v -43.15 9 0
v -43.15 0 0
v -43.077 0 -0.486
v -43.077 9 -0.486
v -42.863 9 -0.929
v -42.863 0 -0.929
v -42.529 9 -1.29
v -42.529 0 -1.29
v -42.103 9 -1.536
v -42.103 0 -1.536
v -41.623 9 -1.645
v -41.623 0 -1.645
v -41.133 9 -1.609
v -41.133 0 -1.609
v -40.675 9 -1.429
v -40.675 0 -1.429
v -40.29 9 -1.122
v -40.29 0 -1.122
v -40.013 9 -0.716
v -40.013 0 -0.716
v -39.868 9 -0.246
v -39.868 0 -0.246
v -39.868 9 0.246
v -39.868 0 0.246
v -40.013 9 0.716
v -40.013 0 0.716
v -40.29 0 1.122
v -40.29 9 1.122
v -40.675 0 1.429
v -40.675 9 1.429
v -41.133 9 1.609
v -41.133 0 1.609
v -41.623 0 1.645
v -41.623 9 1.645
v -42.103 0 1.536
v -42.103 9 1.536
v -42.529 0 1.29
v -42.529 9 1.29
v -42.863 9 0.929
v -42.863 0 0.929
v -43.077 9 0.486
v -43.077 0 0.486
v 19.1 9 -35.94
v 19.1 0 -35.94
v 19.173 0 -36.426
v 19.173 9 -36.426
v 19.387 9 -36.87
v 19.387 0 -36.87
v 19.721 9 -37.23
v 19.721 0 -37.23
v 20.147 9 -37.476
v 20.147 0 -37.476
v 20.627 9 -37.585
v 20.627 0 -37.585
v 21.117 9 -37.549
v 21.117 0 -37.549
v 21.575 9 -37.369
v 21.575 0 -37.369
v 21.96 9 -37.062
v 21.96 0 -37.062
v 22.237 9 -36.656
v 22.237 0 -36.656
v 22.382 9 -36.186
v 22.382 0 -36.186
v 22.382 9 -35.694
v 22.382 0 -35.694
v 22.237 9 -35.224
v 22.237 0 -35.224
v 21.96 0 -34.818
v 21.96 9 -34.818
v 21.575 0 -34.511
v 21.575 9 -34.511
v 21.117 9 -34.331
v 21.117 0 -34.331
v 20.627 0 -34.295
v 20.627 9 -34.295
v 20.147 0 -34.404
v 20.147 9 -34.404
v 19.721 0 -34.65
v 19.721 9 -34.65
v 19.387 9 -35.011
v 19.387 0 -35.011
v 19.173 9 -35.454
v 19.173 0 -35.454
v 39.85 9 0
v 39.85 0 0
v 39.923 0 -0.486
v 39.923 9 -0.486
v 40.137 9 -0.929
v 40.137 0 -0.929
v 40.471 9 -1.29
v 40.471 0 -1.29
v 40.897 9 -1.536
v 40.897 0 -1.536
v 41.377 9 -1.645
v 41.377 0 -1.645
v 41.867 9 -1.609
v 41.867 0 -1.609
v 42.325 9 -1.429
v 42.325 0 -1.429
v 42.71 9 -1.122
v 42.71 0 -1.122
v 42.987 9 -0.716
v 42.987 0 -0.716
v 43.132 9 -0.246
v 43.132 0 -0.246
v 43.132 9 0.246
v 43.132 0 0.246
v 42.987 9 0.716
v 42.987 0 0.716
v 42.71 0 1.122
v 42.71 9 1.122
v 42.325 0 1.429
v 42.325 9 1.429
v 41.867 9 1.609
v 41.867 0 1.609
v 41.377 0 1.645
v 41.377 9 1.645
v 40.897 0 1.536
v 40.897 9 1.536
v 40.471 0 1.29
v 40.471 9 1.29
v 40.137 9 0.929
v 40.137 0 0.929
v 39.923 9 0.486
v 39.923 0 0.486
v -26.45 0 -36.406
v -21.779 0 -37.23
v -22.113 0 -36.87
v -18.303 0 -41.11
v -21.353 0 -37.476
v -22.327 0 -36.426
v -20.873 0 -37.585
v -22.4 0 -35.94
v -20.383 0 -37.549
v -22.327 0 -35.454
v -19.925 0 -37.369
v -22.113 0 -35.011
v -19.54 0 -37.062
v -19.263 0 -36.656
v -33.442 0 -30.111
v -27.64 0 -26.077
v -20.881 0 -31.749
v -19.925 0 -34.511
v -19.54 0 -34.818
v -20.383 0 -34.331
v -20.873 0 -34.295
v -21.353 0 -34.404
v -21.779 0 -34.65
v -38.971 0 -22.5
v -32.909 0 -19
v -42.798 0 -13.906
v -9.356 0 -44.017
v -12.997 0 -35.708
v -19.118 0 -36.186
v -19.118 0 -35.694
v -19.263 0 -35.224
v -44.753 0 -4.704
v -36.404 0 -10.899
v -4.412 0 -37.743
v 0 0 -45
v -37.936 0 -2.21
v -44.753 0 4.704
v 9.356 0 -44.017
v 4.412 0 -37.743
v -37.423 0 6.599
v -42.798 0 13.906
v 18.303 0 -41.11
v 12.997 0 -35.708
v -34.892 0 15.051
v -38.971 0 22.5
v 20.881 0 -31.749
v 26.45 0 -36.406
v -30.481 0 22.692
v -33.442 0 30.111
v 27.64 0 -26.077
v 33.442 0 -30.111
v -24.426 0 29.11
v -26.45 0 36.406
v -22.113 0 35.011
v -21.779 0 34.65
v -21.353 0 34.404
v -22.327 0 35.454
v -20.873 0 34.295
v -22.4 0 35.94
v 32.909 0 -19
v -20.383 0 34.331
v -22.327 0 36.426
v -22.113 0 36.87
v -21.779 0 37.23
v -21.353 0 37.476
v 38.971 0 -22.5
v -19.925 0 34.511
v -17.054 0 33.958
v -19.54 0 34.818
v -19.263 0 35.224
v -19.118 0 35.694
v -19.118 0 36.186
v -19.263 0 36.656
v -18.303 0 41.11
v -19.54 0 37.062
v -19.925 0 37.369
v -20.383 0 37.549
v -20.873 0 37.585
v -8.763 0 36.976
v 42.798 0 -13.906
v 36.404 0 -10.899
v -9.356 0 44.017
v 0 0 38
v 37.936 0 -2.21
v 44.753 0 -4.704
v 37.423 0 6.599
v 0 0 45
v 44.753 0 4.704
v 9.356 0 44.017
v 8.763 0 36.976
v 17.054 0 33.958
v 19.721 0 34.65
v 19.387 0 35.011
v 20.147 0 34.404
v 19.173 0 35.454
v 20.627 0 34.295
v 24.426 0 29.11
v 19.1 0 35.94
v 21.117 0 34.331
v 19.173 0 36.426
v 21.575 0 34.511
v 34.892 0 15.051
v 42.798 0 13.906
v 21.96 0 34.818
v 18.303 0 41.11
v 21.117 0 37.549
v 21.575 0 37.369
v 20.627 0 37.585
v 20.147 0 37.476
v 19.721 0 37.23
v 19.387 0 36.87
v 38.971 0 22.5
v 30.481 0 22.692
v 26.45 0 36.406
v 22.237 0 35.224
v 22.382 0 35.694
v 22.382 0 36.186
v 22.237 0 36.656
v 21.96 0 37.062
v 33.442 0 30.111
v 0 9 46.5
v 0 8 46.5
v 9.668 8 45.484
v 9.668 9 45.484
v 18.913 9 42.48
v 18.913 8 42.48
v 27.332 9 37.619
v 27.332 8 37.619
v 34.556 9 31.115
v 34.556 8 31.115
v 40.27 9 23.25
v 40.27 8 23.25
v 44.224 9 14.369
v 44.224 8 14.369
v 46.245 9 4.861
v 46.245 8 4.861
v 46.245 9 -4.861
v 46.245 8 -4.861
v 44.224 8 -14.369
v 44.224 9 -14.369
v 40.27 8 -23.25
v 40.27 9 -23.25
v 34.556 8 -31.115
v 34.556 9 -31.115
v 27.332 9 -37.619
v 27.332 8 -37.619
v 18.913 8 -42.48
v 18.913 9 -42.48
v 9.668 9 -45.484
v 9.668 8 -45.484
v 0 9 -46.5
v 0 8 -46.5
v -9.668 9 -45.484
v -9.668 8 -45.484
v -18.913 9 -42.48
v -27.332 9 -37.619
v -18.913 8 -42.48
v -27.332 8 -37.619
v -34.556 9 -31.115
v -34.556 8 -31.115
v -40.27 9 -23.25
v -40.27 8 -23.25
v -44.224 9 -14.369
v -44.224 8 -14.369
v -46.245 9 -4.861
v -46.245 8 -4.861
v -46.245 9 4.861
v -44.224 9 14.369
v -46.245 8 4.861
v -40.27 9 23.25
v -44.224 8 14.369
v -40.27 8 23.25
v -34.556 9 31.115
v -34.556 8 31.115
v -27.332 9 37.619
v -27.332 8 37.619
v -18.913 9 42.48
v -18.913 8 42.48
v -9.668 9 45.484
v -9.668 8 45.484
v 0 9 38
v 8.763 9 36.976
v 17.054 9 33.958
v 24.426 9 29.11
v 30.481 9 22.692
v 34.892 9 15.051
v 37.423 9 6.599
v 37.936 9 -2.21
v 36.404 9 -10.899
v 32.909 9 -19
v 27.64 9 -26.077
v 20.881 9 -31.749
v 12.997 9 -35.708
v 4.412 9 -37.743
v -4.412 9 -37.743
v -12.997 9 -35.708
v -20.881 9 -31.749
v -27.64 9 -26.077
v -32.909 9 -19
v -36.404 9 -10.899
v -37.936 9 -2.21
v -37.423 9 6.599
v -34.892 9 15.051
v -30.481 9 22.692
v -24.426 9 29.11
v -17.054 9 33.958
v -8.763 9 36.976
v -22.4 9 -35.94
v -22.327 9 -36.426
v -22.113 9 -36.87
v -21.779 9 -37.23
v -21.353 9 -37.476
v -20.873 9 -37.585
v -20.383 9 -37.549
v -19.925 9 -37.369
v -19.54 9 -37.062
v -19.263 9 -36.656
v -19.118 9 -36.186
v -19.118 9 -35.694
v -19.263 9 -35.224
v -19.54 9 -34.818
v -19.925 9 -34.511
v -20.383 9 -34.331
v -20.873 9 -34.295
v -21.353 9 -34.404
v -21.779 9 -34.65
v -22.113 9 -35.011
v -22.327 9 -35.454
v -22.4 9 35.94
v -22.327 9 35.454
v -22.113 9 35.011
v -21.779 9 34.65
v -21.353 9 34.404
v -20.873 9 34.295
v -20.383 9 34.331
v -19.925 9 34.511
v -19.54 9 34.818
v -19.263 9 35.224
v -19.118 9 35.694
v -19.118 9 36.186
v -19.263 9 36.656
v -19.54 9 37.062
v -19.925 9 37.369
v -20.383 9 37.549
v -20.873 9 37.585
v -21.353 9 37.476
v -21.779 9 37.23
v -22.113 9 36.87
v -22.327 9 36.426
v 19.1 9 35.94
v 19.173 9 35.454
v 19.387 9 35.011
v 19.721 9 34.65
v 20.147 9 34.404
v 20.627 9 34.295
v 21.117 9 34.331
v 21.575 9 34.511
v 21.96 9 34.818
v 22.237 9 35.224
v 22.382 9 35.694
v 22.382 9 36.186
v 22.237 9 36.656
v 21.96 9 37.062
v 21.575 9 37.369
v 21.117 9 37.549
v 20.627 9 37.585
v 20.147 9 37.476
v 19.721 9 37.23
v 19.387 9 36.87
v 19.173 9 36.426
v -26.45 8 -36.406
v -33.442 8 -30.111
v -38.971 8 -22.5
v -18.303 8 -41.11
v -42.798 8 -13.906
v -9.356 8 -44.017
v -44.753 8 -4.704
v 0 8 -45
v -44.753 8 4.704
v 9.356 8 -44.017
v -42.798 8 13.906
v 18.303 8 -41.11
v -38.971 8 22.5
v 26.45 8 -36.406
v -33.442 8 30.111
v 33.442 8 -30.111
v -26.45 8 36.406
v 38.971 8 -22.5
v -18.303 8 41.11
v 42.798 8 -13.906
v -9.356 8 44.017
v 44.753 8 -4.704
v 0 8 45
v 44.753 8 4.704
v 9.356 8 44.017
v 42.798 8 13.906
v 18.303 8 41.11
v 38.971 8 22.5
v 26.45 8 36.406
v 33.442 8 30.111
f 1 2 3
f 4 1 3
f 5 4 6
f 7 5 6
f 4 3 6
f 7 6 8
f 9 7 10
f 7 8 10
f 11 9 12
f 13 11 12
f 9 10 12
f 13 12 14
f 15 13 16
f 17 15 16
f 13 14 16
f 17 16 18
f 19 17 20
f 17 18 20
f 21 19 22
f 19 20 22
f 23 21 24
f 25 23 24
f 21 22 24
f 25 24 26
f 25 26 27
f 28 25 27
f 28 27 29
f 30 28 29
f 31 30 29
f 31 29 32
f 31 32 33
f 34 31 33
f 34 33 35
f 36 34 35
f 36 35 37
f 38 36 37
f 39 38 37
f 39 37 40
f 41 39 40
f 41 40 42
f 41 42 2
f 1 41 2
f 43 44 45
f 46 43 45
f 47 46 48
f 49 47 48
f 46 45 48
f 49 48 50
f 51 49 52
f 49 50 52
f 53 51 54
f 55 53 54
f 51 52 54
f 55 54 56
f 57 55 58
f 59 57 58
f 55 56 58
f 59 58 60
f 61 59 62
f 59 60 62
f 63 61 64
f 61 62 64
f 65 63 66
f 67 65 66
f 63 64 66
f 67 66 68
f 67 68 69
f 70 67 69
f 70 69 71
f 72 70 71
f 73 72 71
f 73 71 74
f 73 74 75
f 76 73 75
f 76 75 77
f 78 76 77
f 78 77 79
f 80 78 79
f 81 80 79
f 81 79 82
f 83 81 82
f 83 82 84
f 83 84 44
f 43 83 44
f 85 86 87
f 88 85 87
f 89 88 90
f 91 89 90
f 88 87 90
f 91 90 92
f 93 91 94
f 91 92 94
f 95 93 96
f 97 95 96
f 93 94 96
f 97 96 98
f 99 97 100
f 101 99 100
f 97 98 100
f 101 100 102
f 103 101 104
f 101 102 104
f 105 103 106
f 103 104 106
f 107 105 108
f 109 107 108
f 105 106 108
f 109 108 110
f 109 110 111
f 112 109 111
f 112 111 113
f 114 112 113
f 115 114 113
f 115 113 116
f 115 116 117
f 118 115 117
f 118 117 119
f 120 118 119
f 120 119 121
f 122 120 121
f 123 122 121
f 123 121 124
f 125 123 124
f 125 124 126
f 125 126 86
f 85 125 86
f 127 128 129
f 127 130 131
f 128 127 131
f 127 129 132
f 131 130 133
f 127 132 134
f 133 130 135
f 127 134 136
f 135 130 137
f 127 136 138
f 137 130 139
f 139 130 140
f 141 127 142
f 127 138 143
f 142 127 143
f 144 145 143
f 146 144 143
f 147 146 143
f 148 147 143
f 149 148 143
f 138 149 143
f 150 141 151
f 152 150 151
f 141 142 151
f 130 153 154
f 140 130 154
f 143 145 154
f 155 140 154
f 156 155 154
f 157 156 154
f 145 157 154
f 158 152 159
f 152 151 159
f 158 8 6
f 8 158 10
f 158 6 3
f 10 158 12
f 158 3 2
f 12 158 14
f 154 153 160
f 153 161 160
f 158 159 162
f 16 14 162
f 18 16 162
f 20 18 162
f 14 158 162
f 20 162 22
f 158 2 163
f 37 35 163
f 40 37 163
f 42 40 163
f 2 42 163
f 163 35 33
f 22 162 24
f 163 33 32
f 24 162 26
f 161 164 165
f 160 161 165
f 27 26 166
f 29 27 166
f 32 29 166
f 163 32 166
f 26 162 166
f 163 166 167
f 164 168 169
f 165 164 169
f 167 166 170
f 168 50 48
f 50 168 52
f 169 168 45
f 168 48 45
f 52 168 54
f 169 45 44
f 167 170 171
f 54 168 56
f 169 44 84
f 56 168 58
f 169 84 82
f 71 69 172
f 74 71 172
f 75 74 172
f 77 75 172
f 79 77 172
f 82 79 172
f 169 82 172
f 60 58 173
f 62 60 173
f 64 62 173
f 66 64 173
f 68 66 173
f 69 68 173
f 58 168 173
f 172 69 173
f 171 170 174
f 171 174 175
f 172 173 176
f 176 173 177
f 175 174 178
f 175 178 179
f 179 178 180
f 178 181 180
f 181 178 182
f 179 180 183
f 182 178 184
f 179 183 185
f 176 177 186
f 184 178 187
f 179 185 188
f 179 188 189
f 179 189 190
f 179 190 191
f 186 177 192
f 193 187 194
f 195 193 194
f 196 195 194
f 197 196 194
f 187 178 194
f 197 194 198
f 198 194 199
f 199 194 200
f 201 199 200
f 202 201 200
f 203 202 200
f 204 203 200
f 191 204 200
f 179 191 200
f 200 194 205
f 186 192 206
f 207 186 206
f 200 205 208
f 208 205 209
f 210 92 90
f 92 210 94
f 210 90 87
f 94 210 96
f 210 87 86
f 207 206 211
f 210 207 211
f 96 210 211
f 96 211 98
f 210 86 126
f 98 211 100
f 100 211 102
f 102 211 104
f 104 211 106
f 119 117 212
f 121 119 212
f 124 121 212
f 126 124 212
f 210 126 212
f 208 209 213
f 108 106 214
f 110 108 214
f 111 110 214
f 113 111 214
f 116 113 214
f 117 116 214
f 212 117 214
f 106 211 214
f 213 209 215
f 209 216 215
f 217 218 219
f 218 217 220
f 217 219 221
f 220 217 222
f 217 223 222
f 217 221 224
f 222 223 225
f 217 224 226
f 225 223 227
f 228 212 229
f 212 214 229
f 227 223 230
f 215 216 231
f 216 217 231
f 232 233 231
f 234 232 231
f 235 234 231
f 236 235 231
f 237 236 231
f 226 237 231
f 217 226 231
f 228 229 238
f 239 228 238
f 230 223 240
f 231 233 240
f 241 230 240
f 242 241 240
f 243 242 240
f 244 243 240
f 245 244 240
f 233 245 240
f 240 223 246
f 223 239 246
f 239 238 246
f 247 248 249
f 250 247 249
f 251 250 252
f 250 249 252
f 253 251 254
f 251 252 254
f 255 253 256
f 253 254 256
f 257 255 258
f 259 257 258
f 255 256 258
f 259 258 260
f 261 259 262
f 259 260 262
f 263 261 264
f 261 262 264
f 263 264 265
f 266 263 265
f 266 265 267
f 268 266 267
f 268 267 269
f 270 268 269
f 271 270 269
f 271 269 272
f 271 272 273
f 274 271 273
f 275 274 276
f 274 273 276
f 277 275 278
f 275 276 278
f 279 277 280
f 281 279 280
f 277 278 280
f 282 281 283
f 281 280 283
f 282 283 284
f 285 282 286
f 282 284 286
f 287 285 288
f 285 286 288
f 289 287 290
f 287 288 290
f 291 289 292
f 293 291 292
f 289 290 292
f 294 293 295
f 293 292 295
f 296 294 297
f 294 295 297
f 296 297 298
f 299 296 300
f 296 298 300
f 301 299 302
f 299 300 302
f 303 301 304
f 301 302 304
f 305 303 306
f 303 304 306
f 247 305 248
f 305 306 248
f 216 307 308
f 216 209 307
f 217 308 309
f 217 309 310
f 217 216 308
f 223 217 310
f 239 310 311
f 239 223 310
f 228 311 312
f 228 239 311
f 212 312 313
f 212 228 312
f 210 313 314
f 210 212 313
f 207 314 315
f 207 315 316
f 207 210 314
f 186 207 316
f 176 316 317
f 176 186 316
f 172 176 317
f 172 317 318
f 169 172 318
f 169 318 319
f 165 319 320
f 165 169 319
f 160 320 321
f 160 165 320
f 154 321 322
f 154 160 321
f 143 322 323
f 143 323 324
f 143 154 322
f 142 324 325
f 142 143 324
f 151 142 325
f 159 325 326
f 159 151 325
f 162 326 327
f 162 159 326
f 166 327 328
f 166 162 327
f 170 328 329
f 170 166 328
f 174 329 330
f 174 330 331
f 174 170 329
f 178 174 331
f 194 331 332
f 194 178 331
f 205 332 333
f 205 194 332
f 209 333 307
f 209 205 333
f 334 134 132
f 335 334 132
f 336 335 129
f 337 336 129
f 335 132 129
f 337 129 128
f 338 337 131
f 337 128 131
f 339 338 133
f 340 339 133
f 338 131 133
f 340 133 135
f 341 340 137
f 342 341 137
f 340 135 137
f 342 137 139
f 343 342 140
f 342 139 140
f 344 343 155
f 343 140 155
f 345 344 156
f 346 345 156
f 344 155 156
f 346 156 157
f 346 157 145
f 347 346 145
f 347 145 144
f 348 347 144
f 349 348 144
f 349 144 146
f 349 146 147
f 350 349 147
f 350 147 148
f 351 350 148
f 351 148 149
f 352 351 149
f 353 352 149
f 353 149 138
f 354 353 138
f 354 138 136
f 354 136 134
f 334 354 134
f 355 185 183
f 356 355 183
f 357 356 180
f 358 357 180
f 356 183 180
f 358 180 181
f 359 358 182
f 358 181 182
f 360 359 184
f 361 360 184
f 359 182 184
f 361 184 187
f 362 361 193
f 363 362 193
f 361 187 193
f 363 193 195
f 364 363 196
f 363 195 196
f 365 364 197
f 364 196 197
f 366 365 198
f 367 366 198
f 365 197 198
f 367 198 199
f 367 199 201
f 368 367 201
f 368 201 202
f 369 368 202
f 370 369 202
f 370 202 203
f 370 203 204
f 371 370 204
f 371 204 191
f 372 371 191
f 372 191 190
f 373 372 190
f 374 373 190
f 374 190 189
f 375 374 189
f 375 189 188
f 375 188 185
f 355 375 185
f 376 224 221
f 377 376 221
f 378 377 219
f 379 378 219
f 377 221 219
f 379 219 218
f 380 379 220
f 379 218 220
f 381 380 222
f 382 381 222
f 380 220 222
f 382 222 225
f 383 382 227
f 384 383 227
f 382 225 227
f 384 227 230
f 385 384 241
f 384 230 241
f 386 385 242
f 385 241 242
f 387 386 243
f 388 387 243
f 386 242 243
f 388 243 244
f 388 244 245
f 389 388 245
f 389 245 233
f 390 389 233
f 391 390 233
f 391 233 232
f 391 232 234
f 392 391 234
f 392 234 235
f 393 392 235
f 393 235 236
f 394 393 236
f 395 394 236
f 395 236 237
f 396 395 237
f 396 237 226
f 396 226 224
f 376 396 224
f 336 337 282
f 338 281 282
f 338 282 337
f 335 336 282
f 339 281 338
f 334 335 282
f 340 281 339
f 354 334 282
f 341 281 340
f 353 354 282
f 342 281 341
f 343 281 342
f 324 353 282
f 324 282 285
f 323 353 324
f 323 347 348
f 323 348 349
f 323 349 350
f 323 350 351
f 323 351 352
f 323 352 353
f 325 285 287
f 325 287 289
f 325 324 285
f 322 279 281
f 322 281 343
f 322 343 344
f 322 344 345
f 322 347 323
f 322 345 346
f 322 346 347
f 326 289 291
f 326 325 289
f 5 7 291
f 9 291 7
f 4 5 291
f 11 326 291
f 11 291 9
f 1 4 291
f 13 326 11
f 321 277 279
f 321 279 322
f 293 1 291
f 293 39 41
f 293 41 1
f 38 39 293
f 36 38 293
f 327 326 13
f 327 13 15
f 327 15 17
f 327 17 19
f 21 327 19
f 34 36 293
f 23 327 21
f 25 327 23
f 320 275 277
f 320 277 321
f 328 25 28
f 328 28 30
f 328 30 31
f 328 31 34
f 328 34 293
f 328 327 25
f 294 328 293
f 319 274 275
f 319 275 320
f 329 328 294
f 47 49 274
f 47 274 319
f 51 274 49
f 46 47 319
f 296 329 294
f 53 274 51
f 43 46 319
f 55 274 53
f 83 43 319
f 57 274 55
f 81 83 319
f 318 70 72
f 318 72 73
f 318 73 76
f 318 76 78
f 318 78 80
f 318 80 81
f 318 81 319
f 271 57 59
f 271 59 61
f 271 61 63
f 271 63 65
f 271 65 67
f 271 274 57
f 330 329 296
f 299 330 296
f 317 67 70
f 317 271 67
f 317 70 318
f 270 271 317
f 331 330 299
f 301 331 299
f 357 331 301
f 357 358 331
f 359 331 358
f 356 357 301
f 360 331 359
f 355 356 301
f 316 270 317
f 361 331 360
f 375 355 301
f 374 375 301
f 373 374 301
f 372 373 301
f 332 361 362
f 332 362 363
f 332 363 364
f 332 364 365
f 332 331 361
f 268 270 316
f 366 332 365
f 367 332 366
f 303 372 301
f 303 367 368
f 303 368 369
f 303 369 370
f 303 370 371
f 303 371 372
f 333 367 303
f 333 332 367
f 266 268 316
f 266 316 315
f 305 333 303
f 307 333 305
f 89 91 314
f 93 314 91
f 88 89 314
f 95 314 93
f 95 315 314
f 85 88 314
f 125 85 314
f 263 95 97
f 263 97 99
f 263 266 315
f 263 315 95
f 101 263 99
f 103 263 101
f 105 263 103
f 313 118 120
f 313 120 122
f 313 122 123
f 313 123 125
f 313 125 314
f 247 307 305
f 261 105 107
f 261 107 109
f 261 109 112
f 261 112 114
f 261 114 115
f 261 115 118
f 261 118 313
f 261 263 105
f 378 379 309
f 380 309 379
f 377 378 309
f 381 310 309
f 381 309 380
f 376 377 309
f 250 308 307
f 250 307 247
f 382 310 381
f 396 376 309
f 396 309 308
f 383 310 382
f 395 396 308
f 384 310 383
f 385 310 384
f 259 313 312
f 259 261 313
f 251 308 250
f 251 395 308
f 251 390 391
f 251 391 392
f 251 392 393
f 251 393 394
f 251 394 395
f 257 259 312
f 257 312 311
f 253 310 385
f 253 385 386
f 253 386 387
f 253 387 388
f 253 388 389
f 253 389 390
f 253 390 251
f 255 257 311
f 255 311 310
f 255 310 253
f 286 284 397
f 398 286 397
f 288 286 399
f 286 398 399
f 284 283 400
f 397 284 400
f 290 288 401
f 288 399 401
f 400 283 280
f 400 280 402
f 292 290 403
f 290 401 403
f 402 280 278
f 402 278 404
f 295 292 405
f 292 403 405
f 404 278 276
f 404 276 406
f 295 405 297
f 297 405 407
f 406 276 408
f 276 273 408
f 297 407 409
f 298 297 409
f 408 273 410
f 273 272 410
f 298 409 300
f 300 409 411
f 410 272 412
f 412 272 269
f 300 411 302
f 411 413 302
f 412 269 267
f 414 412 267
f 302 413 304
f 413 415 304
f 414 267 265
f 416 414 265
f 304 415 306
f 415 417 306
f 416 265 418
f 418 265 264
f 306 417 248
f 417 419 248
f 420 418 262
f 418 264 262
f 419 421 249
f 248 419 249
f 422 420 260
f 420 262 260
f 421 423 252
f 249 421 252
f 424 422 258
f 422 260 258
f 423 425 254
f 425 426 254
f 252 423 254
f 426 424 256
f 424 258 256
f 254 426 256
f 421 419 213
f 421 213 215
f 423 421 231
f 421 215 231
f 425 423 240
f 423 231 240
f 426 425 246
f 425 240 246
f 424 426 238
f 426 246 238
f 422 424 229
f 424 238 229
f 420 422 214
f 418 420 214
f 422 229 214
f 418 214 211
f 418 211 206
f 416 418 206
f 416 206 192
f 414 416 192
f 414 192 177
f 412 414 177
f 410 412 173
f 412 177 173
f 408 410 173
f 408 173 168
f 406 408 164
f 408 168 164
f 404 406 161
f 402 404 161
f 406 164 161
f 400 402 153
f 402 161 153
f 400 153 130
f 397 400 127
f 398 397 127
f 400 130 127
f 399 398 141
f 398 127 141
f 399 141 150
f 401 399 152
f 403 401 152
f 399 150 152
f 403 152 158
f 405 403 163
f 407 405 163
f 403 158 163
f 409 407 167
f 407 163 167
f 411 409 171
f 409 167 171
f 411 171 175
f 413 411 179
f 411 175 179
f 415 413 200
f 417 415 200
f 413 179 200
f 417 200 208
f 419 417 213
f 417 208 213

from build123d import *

# Parameters (mm, degrees)
SKETCH_2_R         = 45
SKETCH_2_R_2       = 38
EXTRUDE_1_DEPTH    = 8
SKETCH_6_R         = 46.5
SKETCH_6_R_2       = 38
EXTRUDE_3_DEPTH    = 1
HOLE_WIZARD_M4_1_D = 3.3


with BuildPart() as part:
    # 草图2 → 凸台-拉伸1 (new body)
    with BuildSketch(Plane(origin=(0, 0, 0), x_dir=(1, 0, 0), z_dir=(0, 1, 0))):
        with Locations(Location((0, 0, 0), (0, 0, 270))):
            Circle(SKETCH_2_R)
        with Locations(Location((0, 0, 0), (0, 0, 270))):
            Circle(SKETCH_2_R_2, mode=Mode.SUBTRACT)
    extrude(amount=EXTRUDE_1_DEPTH)

    # 草图6 → 凸台-拉伸3 (add)
    with BuildSketch(Plane(origin=(0, 8, 0), x_dir=(1, 0, 0), z_dir=(0, 1, 0))):
        with Locations(Location((0, 0, 0), (0, 0, 270))):
            Circle(SKETCH_6_R)
        with Locations(Location((0, 0, 0), (0, 0, 270))):
            Circle(SKETCH_6_R_2, mode=Mode.SUBTRACT)
    extrude(amount=EXTRUDE_3_DEPTH)

    # M4 螺纹孔1 (through all)
    with Locations(Plane(origin=(0, 9, 0), x_dir=(1, 0, 0), z_dir=(0, 1, 0))):
        with Locations((-20.75, 35.940054257), (20.75, 35.940054257), (41.5, 0), (20.75, -35.940054257), (-20.75, -35.940054257), (-41.5, 0)):
            Hole(HOLE_WIZARD_M4_1_D / 2)


solid = part.part
